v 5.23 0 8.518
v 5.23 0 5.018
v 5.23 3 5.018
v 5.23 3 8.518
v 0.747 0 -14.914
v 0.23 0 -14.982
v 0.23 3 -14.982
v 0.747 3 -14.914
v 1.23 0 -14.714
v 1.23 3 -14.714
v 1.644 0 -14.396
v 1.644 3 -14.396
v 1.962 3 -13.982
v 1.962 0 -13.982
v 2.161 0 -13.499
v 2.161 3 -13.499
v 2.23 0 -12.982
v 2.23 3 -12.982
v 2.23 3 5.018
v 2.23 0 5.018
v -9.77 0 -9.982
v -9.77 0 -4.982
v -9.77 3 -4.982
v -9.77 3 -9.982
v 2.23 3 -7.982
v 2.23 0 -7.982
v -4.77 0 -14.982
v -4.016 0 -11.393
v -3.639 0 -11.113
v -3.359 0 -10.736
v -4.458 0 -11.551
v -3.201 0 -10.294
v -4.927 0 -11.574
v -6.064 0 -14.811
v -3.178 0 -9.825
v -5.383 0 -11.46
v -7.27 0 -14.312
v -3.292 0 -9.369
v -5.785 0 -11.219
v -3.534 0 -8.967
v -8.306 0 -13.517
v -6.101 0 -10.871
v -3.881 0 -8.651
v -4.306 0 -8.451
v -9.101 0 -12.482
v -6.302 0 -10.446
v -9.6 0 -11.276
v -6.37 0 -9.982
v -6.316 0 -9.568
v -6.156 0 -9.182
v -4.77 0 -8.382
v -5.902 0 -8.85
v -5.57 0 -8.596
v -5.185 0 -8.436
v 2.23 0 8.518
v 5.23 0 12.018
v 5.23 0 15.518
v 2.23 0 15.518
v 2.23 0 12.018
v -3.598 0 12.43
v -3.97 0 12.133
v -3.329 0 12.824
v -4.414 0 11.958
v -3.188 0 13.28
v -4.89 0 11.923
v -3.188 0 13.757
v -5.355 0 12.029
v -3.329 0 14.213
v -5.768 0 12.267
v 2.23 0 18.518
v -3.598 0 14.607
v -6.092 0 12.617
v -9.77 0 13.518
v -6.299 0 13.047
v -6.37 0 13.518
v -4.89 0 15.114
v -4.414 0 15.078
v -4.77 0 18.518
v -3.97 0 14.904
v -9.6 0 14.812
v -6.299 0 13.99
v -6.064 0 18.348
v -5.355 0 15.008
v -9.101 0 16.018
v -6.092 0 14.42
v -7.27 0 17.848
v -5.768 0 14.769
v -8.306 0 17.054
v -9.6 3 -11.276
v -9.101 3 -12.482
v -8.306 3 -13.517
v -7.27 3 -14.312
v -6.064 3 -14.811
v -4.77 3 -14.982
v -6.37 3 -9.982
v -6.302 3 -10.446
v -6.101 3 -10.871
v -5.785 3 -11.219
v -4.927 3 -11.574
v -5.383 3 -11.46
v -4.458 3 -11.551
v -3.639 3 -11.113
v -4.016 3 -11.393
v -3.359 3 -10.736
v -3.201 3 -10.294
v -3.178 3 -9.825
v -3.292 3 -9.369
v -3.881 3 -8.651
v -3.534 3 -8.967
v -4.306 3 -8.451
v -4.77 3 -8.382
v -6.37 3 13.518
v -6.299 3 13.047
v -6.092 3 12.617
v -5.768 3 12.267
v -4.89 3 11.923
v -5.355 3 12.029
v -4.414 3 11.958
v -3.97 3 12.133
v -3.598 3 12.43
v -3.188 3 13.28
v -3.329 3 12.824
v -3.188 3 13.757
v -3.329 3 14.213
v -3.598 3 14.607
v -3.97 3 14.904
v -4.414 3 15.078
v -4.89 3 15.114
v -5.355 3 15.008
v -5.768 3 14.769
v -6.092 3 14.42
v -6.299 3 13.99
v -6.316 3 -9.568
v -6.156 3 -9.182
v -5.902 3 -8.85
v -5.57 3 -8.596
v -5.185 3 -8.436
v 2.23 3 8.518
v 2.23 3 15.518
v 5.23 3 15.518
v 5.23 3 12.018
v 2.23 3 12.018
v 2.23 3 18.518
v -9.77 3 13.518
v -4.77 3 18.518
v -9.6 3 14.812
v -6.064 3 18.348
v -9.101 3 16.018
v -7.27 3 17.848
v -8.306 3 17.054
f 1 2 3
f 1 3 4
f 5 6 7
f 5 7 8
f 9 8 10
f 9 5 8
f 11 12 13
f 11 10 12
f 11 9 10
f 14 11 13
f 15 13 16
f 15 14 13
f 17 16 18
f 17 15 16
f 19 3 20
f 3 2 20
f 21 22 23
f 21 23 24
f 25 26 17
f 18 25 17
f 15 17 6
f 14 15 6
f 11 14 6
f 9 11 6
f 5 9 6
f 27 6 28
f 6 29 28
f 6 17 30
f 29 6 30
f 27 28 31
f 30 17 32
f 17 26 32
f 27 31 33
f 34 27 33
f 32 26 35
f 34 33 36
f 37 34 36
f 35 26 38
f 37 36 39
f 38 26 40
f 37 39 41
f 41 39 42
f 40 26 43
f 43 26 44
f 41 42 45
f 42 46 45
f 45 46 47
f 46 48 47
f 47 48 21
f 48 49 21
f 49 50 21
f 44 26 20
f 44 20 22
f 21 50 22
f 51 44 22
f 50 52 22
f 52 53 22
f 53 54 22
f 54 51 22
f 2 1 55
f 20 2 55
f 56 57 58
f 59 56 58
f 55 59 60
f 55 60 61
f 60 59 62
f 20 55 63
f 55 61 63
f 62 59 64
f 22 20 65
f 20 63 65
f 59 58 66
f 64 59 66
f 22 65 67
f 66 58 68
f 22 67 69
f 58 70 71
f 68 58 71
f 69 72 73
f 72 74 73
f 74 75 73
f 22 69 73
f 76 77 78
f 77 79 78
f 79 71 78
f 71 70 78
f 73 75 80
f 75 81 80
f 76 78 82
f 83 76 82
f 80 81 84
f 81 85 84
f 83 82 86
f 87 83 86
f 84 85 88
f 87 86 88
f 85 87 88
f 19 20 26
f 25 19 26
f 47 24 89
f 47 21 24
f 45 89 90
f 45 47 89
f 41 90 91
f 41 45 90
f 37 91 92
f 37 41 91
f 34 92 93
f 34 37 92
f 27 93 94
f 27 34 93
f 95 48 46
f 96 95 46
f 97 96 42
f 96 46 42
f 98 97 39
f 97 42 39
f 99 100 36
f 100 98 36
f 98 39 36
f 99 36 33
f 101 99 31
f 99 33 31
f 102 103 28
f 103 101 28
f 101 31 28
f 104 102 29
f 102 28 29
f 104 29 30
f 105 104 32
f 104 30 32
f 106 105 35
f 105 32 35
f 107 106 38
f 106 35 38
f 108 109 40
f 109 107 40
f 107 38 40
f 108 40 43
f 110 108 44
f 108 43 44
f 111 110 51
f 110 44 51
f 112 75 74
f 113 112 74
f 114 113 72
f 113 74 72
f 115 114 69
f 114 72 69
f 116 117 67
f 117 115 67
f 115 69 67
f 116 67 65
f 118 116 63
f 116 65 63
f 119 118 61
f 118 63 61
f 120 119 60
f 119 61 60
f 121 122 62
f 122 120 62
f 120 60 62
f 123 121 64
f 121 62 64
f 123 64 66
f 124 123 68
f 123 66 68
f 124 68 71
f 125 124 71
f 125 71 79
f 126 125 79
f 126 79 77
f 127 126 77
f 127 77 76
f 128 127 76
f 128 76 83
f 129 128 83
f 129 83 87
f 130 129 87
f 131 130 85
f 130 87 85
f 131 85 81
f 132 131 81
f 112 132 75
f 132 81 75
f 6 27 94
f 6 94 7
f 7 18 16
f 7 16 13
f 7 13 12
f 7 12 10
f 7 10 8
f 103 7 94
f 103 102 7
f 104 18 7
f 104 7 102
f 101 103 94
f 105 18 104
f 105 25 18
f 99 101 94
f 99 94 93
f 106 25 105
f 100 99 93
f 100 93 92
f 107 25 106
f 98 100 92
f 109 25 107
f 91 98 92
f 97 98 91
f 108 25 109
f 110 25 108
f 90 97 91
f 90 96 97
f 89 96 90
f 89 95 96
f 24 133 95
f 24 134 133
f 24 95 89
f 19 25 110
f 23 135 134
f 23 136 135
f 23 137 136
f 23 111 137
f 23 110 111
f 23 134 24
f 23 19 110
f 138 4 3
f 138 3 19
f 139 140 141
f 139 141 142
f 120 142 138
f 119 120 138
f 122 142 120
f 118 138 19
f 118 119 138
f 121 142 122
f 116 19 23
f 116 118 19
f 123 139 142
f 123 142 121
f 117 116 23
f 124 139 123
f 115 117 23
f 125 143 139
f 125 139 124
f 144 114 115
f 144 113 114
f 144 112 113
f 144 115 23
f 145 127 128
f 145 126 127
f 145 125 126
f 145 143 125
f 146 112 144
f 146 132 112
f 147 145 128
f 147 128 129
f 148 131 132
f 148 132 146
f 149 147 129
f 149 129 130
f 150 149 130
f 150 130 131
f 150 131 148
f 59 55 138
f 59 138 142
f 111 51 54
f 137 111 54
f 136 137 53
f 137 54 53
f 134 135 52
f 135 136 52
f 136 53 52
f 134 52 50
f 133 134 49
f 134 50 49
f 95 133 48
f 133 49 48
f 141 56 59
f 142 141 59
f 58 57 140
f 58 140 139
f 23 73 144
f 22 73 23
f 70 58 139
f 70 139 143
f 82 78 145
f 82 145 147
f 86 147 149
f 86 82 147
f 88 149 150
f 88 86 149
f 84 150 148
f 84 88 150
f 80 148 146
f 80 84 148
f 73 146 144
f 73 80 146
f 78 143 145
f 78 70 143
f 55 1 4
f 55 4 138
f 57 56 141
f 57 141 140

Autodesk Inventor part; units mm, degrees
ref_plane "YZ Plane" through (0, 0, 0) normal (1, 0, 0) x (0, 1, 0)
ref_plane "XZ Plane" through (0, 0, 0) normal (0, 1, 0) x (-1, 0, 0)
ref_plane "XY Plane" through (0, 0, 0) normal (0, 0, 1) x (1, 0, 0)
sketch "Sketch1" plane through (0, 0, 0) normal (0, 1, 0) x (-1, 0, 0)
  circle A0 centre (4.7704, 13.5183) radius 1.6
  circle A1 centre (4.7704, -9.9817) radius 1.6
  line L0 (-5.2296, 5.0183) -> (-2.2296, 5.0183)
  line L1 (-5.2296, 15.5183) -> (-2.2296, 15.5183)
  line L2 (-5.2296, 8.5183) -> (-2.2296, 8.5183)
  line L3 (-5.2296, 12.0183) -> (-2.2296, 12.0183)
  line L4 (-5.2296, 5.0183) -> (-5.2296, 8.5183)
  line L5 (-5.2296, 12.0183) -> (-5.2296, 15.5183)
  line L6 (-2.2296, 15.5183) -> (-2.2296, 18.5183)
  line L7 (-2.2296, 5.0183) -> (-2.2296, -7.9817)
  line L8 (-2.2296, 8.5183) -> (-2.2296, 12.0183)
  line L9 (-2.2296, 18.5183) -> (4.7704, 18.5183)
  arc A2 (9.7704, 13.5183) -> (4.7704, 18.5183) centre (4.7704, 13.5183) ccw
  line L10 (9.7704, 13.5183) -> (9.7704, -4.9817)
  arc A3 (4.7704, -14.9817) -> (9.7704, -9.9817) centre (4.7704, -9.9817) ccw
  line L11 (4.7704, -14.9817) -> (-0.2296, -14.9817)
  arc A4 (-2.2296, -12.9817) -> (-0.2296, -14.9817) centre (-0.2296, -12.9817) ccw
  line L12 (4.7704, -4.9817) -> (4.7704, -9.9817)
  line L13 (-2.2296, -7.9817) -> (-2.2296, -12.9817)
  line L14 (9.7704, -4.9817) -> (9.7704, -9.9817)
  point P0 (0, 0)
  dimension "d2" = 5
extrude "Extrusion1" add sketch "Sketch1" along normal blind 3
properties part number "camMountBracket"
